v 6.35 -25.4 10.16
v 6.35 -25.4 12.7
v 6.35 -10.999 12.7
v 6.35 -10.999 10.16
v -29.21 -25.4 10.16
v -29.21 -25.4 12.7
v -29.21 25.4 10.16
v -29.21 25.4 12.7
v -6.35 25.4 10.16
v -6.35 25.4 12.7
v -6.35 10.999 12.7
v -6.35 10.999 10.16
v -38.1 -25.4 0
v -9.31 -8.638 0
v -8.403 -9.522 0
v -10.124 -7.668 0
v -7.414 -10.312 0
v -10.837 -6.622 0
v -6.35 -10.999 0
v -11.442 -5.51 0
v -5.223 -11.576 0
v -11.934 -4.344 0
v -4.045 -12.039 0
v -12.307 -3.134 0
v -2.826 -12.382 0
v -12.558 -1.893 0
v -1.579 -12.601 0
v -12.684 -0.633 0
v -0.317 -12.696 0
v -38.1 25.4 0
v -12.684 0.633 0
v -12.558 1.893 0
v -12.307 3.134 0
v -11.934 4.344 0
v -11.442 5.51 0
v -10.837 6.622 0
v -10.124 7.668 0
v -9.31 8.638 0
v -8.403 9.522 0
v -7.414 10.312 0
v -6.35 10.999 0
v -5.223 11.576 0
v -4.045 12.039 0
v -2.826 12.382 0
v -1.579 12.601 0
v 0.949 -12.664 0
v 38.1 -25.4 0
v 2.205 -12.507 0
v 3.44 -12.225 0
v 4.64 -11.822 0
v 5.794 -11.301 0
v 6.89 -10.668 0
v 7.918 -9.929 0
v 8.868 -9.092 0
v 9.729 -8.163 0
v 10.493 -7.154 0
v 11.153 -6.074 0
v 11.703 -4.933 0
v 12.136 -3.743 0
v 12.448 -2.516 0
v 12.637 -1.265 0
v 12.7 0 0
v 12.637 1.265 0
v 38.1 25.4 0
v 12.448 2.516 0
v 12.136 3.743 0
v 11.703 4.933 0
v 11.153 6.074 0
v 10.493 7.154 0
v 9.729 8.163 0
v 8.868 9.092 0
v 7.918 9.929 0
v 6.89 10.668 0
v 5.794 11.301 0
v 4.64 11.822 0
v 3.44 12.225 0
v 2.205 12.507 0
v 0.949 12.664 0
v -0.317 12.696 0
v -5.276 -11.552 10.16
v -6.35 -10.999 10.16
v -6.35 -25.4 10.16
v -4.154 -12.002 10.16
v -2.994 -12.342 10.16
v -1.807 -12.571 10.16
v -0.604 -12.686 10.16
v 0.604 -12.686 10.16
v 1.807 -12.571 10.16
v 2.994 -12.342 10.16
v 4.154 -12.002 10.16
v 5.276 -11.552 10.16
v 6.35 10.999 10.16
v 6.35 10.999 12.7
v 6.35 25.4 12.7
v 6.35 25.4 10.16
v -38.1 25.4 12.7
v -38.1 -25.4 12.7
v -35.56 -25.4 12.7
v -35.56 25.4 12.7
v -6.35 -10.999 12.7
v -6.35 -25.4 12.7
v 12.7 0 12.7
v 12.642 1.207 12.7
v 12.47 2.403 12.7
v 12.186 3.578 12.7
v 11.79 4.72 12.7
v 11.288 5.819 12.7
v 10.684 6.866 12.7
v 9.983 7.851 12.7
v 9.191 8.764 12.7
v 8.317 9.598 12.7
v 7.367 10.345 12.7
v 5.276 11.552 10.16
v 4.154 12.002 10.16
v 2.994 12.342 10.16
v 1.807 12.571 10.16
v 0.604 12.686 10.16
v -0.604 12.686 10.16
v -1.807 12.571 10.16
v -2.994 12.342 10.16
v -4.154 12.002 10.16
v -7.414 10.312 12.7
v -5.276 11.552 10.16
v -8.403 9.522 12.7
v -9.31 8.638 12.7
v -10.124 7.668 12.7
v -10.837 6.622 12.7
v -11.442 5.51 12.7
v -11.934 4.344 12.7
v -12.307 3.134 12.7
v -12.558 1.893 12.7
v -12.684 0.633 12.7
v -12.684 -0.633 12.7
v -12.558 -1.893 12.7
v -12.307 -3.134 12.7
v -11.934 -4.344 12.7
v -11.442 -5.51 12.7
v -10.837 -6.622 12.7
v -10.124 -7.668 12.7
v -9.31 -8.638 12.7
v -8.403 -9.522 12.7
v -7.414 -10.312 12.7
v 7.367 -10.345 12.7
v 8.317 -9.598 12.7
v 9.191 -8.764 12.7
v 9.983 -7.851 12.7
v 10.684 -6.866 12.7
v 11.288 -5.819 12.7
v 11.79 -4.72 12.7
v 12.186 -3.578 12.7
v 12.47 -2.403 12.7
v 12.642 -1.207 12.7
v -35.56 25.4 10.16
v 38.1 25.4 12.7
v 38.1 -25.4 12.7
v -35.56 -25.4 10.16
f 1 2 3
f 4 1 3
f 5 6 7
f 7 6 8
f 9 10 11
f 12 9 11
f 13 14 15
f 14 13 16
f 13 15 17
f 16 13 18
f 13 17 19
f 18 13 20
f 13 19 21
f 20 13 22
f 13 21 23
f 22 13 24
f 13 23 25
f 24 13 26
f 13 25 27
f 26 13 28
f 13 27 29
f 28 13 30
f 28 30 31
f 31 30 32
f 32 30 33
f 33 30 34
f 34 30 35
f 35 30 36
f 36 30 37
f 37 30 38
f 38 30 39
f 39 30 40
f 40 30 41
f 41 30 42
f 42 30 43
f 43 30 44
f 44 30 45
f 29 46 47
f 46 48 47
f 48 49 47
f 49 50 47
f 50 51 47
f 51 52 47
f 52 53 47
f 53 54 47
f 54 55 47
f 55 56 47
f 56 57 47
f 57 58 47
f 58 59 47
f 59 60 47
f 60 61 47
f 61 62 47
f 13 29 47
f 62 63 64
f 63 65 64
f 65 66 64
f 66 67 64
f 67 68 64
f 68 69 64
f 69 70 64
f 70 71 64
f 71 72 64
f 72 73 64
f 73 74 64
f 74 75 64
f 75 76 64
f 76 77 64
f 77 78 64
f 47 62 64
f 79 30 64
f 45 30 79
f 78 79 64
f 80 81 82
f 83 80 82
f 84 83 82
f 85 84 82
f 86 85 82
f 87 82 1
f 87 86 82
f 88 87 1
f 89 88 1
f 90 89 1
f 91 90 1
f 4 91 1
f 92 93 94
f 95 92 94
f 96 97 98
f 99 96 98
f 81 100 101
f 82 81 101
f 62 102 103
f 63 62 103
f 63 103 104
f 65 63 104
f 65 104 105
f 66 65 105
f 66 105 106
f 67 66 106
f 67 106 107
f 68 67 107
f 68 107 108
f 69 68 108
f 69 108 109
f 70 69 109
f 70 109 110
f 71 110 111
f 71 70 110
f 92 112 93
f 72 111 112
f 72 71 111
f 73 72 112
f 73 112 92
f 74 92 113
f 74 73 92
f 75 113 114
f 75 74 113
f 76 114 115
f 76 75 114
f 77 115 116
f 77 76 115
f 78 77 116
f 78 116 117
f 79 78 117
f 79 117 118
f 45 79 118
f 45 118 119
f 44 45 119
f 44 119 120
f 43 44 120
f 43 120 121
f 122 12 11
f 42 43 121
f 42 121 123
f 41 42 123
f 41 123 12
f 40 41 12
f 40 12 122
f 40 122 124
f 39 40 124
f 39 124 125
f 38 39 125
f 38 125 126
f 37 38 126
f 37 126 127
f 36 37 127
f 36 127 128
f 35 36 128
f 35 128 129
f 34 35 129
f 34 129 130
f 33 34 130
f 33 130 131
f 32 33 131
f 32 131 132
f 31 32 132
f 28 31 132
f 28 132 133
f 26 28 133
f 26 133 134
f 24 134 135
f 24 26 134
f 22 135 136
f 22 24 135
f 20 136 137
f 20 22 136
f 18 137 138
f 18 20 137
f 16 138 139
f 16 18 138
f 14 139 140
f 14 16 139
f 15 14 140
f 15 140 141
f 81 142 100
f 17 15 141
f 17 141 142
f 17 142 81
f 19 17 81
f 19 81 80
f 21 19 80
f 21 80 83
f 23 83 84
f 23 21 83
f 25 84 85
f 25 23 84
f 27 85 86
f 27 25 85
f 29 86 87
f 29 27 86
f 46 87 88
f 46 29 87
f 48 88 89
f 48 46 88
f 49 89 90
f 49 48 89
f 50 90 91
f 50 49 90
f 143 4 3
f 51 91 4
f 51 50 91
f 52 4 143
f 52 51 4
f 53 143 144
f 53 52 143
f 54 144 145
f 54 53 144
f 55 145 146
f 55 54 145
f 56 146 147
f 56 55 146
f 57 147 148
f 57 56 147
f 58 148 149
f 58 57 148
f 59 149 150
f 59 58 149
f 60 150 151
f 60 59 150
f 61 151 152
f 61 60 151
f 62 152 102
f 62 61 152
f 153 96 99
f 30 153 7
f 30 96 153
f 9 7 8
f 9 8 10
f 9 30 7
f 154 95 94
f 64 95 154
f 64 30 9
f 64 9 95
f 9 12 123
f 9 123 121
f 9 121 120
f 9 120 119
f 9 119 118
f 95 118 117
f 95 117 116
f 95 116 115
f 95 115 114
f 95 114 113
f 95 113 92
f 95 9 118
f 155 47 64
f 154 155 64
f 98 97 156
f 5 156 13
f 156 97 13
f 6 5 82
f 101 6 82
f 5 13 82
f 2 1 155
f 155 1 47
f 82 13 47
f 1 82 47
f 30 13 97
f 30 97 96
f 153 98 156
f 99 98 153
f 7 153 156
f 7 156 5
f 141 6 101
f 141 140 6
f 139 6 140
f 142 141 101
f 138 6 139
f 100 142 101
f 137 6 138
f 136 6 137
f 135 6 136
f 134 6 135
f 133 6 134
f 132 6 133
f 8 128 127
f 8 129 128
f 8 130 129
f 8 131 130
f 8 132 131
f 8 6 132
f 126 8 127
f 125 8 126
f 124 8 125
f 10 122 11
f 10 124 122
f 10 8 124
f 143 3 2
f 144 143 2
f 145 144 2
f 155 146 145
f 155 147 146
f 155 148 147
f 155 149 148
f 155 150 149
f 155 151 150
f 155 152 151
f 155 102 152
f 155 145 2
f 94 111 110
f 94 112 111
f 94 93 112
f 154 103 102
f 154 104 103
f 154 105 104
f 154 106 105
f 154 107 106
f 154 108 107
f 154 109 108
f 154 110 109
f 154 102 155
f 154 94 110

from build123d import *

# Parameters (mm, degrees)
F0_W     = 76.2
F0_H     = 50.8
F0_R     = 12.7
F1_DEPTH = 12.7
F2_W     = 6.35
F2_H     = 50.8
F3_DEPTH = 2.54


with BuildPart() as f1:
    # F0 (on Top) → F1 (new body)
    with BuildSketch(Plane.XY):
        Rectangle(F0_W, F0_H)
        Circle(F0_R, mode=Mode.SUBTRACT)
    extrude(amount=F1_DEPTH)

    # F2 (on face) → F3 (cut)
    with BuildSketch(Plane.XY.offset(12.7)):
        with Locations((-32.385, 0)):
            Rectangle(F2_W, F2_H)
        with BuildLine():
            Line((6.35, 25.4), (-6.35, 25.4))
            Line((-6.35, 25.4), (-6.35, 10.9985226281))
            ThreePointArc((-6.35, 10.9985226281), (0, 12.7), (6.35, 10.9985226281))
            Line((6.35, 10.9985226281), (6.35, 25.4))
        make_face()
        with BuildLine():
            Line((-6.35, -10.9985226281), (-6.35, -25.4))
            Line((-6.35, -25.4), (6.35, -25.4))
            Line((6.35, -25.4), (6.35, -10.9985226281))
            ThreePointArc((6.35, -10.9985226281), (0, -12.7), (-6.35, -10.9985226281))
        make_face()
    extrude(amount=-F3_DEPTH, mode=Mode.SUBTRACT)


solid = f1.part
